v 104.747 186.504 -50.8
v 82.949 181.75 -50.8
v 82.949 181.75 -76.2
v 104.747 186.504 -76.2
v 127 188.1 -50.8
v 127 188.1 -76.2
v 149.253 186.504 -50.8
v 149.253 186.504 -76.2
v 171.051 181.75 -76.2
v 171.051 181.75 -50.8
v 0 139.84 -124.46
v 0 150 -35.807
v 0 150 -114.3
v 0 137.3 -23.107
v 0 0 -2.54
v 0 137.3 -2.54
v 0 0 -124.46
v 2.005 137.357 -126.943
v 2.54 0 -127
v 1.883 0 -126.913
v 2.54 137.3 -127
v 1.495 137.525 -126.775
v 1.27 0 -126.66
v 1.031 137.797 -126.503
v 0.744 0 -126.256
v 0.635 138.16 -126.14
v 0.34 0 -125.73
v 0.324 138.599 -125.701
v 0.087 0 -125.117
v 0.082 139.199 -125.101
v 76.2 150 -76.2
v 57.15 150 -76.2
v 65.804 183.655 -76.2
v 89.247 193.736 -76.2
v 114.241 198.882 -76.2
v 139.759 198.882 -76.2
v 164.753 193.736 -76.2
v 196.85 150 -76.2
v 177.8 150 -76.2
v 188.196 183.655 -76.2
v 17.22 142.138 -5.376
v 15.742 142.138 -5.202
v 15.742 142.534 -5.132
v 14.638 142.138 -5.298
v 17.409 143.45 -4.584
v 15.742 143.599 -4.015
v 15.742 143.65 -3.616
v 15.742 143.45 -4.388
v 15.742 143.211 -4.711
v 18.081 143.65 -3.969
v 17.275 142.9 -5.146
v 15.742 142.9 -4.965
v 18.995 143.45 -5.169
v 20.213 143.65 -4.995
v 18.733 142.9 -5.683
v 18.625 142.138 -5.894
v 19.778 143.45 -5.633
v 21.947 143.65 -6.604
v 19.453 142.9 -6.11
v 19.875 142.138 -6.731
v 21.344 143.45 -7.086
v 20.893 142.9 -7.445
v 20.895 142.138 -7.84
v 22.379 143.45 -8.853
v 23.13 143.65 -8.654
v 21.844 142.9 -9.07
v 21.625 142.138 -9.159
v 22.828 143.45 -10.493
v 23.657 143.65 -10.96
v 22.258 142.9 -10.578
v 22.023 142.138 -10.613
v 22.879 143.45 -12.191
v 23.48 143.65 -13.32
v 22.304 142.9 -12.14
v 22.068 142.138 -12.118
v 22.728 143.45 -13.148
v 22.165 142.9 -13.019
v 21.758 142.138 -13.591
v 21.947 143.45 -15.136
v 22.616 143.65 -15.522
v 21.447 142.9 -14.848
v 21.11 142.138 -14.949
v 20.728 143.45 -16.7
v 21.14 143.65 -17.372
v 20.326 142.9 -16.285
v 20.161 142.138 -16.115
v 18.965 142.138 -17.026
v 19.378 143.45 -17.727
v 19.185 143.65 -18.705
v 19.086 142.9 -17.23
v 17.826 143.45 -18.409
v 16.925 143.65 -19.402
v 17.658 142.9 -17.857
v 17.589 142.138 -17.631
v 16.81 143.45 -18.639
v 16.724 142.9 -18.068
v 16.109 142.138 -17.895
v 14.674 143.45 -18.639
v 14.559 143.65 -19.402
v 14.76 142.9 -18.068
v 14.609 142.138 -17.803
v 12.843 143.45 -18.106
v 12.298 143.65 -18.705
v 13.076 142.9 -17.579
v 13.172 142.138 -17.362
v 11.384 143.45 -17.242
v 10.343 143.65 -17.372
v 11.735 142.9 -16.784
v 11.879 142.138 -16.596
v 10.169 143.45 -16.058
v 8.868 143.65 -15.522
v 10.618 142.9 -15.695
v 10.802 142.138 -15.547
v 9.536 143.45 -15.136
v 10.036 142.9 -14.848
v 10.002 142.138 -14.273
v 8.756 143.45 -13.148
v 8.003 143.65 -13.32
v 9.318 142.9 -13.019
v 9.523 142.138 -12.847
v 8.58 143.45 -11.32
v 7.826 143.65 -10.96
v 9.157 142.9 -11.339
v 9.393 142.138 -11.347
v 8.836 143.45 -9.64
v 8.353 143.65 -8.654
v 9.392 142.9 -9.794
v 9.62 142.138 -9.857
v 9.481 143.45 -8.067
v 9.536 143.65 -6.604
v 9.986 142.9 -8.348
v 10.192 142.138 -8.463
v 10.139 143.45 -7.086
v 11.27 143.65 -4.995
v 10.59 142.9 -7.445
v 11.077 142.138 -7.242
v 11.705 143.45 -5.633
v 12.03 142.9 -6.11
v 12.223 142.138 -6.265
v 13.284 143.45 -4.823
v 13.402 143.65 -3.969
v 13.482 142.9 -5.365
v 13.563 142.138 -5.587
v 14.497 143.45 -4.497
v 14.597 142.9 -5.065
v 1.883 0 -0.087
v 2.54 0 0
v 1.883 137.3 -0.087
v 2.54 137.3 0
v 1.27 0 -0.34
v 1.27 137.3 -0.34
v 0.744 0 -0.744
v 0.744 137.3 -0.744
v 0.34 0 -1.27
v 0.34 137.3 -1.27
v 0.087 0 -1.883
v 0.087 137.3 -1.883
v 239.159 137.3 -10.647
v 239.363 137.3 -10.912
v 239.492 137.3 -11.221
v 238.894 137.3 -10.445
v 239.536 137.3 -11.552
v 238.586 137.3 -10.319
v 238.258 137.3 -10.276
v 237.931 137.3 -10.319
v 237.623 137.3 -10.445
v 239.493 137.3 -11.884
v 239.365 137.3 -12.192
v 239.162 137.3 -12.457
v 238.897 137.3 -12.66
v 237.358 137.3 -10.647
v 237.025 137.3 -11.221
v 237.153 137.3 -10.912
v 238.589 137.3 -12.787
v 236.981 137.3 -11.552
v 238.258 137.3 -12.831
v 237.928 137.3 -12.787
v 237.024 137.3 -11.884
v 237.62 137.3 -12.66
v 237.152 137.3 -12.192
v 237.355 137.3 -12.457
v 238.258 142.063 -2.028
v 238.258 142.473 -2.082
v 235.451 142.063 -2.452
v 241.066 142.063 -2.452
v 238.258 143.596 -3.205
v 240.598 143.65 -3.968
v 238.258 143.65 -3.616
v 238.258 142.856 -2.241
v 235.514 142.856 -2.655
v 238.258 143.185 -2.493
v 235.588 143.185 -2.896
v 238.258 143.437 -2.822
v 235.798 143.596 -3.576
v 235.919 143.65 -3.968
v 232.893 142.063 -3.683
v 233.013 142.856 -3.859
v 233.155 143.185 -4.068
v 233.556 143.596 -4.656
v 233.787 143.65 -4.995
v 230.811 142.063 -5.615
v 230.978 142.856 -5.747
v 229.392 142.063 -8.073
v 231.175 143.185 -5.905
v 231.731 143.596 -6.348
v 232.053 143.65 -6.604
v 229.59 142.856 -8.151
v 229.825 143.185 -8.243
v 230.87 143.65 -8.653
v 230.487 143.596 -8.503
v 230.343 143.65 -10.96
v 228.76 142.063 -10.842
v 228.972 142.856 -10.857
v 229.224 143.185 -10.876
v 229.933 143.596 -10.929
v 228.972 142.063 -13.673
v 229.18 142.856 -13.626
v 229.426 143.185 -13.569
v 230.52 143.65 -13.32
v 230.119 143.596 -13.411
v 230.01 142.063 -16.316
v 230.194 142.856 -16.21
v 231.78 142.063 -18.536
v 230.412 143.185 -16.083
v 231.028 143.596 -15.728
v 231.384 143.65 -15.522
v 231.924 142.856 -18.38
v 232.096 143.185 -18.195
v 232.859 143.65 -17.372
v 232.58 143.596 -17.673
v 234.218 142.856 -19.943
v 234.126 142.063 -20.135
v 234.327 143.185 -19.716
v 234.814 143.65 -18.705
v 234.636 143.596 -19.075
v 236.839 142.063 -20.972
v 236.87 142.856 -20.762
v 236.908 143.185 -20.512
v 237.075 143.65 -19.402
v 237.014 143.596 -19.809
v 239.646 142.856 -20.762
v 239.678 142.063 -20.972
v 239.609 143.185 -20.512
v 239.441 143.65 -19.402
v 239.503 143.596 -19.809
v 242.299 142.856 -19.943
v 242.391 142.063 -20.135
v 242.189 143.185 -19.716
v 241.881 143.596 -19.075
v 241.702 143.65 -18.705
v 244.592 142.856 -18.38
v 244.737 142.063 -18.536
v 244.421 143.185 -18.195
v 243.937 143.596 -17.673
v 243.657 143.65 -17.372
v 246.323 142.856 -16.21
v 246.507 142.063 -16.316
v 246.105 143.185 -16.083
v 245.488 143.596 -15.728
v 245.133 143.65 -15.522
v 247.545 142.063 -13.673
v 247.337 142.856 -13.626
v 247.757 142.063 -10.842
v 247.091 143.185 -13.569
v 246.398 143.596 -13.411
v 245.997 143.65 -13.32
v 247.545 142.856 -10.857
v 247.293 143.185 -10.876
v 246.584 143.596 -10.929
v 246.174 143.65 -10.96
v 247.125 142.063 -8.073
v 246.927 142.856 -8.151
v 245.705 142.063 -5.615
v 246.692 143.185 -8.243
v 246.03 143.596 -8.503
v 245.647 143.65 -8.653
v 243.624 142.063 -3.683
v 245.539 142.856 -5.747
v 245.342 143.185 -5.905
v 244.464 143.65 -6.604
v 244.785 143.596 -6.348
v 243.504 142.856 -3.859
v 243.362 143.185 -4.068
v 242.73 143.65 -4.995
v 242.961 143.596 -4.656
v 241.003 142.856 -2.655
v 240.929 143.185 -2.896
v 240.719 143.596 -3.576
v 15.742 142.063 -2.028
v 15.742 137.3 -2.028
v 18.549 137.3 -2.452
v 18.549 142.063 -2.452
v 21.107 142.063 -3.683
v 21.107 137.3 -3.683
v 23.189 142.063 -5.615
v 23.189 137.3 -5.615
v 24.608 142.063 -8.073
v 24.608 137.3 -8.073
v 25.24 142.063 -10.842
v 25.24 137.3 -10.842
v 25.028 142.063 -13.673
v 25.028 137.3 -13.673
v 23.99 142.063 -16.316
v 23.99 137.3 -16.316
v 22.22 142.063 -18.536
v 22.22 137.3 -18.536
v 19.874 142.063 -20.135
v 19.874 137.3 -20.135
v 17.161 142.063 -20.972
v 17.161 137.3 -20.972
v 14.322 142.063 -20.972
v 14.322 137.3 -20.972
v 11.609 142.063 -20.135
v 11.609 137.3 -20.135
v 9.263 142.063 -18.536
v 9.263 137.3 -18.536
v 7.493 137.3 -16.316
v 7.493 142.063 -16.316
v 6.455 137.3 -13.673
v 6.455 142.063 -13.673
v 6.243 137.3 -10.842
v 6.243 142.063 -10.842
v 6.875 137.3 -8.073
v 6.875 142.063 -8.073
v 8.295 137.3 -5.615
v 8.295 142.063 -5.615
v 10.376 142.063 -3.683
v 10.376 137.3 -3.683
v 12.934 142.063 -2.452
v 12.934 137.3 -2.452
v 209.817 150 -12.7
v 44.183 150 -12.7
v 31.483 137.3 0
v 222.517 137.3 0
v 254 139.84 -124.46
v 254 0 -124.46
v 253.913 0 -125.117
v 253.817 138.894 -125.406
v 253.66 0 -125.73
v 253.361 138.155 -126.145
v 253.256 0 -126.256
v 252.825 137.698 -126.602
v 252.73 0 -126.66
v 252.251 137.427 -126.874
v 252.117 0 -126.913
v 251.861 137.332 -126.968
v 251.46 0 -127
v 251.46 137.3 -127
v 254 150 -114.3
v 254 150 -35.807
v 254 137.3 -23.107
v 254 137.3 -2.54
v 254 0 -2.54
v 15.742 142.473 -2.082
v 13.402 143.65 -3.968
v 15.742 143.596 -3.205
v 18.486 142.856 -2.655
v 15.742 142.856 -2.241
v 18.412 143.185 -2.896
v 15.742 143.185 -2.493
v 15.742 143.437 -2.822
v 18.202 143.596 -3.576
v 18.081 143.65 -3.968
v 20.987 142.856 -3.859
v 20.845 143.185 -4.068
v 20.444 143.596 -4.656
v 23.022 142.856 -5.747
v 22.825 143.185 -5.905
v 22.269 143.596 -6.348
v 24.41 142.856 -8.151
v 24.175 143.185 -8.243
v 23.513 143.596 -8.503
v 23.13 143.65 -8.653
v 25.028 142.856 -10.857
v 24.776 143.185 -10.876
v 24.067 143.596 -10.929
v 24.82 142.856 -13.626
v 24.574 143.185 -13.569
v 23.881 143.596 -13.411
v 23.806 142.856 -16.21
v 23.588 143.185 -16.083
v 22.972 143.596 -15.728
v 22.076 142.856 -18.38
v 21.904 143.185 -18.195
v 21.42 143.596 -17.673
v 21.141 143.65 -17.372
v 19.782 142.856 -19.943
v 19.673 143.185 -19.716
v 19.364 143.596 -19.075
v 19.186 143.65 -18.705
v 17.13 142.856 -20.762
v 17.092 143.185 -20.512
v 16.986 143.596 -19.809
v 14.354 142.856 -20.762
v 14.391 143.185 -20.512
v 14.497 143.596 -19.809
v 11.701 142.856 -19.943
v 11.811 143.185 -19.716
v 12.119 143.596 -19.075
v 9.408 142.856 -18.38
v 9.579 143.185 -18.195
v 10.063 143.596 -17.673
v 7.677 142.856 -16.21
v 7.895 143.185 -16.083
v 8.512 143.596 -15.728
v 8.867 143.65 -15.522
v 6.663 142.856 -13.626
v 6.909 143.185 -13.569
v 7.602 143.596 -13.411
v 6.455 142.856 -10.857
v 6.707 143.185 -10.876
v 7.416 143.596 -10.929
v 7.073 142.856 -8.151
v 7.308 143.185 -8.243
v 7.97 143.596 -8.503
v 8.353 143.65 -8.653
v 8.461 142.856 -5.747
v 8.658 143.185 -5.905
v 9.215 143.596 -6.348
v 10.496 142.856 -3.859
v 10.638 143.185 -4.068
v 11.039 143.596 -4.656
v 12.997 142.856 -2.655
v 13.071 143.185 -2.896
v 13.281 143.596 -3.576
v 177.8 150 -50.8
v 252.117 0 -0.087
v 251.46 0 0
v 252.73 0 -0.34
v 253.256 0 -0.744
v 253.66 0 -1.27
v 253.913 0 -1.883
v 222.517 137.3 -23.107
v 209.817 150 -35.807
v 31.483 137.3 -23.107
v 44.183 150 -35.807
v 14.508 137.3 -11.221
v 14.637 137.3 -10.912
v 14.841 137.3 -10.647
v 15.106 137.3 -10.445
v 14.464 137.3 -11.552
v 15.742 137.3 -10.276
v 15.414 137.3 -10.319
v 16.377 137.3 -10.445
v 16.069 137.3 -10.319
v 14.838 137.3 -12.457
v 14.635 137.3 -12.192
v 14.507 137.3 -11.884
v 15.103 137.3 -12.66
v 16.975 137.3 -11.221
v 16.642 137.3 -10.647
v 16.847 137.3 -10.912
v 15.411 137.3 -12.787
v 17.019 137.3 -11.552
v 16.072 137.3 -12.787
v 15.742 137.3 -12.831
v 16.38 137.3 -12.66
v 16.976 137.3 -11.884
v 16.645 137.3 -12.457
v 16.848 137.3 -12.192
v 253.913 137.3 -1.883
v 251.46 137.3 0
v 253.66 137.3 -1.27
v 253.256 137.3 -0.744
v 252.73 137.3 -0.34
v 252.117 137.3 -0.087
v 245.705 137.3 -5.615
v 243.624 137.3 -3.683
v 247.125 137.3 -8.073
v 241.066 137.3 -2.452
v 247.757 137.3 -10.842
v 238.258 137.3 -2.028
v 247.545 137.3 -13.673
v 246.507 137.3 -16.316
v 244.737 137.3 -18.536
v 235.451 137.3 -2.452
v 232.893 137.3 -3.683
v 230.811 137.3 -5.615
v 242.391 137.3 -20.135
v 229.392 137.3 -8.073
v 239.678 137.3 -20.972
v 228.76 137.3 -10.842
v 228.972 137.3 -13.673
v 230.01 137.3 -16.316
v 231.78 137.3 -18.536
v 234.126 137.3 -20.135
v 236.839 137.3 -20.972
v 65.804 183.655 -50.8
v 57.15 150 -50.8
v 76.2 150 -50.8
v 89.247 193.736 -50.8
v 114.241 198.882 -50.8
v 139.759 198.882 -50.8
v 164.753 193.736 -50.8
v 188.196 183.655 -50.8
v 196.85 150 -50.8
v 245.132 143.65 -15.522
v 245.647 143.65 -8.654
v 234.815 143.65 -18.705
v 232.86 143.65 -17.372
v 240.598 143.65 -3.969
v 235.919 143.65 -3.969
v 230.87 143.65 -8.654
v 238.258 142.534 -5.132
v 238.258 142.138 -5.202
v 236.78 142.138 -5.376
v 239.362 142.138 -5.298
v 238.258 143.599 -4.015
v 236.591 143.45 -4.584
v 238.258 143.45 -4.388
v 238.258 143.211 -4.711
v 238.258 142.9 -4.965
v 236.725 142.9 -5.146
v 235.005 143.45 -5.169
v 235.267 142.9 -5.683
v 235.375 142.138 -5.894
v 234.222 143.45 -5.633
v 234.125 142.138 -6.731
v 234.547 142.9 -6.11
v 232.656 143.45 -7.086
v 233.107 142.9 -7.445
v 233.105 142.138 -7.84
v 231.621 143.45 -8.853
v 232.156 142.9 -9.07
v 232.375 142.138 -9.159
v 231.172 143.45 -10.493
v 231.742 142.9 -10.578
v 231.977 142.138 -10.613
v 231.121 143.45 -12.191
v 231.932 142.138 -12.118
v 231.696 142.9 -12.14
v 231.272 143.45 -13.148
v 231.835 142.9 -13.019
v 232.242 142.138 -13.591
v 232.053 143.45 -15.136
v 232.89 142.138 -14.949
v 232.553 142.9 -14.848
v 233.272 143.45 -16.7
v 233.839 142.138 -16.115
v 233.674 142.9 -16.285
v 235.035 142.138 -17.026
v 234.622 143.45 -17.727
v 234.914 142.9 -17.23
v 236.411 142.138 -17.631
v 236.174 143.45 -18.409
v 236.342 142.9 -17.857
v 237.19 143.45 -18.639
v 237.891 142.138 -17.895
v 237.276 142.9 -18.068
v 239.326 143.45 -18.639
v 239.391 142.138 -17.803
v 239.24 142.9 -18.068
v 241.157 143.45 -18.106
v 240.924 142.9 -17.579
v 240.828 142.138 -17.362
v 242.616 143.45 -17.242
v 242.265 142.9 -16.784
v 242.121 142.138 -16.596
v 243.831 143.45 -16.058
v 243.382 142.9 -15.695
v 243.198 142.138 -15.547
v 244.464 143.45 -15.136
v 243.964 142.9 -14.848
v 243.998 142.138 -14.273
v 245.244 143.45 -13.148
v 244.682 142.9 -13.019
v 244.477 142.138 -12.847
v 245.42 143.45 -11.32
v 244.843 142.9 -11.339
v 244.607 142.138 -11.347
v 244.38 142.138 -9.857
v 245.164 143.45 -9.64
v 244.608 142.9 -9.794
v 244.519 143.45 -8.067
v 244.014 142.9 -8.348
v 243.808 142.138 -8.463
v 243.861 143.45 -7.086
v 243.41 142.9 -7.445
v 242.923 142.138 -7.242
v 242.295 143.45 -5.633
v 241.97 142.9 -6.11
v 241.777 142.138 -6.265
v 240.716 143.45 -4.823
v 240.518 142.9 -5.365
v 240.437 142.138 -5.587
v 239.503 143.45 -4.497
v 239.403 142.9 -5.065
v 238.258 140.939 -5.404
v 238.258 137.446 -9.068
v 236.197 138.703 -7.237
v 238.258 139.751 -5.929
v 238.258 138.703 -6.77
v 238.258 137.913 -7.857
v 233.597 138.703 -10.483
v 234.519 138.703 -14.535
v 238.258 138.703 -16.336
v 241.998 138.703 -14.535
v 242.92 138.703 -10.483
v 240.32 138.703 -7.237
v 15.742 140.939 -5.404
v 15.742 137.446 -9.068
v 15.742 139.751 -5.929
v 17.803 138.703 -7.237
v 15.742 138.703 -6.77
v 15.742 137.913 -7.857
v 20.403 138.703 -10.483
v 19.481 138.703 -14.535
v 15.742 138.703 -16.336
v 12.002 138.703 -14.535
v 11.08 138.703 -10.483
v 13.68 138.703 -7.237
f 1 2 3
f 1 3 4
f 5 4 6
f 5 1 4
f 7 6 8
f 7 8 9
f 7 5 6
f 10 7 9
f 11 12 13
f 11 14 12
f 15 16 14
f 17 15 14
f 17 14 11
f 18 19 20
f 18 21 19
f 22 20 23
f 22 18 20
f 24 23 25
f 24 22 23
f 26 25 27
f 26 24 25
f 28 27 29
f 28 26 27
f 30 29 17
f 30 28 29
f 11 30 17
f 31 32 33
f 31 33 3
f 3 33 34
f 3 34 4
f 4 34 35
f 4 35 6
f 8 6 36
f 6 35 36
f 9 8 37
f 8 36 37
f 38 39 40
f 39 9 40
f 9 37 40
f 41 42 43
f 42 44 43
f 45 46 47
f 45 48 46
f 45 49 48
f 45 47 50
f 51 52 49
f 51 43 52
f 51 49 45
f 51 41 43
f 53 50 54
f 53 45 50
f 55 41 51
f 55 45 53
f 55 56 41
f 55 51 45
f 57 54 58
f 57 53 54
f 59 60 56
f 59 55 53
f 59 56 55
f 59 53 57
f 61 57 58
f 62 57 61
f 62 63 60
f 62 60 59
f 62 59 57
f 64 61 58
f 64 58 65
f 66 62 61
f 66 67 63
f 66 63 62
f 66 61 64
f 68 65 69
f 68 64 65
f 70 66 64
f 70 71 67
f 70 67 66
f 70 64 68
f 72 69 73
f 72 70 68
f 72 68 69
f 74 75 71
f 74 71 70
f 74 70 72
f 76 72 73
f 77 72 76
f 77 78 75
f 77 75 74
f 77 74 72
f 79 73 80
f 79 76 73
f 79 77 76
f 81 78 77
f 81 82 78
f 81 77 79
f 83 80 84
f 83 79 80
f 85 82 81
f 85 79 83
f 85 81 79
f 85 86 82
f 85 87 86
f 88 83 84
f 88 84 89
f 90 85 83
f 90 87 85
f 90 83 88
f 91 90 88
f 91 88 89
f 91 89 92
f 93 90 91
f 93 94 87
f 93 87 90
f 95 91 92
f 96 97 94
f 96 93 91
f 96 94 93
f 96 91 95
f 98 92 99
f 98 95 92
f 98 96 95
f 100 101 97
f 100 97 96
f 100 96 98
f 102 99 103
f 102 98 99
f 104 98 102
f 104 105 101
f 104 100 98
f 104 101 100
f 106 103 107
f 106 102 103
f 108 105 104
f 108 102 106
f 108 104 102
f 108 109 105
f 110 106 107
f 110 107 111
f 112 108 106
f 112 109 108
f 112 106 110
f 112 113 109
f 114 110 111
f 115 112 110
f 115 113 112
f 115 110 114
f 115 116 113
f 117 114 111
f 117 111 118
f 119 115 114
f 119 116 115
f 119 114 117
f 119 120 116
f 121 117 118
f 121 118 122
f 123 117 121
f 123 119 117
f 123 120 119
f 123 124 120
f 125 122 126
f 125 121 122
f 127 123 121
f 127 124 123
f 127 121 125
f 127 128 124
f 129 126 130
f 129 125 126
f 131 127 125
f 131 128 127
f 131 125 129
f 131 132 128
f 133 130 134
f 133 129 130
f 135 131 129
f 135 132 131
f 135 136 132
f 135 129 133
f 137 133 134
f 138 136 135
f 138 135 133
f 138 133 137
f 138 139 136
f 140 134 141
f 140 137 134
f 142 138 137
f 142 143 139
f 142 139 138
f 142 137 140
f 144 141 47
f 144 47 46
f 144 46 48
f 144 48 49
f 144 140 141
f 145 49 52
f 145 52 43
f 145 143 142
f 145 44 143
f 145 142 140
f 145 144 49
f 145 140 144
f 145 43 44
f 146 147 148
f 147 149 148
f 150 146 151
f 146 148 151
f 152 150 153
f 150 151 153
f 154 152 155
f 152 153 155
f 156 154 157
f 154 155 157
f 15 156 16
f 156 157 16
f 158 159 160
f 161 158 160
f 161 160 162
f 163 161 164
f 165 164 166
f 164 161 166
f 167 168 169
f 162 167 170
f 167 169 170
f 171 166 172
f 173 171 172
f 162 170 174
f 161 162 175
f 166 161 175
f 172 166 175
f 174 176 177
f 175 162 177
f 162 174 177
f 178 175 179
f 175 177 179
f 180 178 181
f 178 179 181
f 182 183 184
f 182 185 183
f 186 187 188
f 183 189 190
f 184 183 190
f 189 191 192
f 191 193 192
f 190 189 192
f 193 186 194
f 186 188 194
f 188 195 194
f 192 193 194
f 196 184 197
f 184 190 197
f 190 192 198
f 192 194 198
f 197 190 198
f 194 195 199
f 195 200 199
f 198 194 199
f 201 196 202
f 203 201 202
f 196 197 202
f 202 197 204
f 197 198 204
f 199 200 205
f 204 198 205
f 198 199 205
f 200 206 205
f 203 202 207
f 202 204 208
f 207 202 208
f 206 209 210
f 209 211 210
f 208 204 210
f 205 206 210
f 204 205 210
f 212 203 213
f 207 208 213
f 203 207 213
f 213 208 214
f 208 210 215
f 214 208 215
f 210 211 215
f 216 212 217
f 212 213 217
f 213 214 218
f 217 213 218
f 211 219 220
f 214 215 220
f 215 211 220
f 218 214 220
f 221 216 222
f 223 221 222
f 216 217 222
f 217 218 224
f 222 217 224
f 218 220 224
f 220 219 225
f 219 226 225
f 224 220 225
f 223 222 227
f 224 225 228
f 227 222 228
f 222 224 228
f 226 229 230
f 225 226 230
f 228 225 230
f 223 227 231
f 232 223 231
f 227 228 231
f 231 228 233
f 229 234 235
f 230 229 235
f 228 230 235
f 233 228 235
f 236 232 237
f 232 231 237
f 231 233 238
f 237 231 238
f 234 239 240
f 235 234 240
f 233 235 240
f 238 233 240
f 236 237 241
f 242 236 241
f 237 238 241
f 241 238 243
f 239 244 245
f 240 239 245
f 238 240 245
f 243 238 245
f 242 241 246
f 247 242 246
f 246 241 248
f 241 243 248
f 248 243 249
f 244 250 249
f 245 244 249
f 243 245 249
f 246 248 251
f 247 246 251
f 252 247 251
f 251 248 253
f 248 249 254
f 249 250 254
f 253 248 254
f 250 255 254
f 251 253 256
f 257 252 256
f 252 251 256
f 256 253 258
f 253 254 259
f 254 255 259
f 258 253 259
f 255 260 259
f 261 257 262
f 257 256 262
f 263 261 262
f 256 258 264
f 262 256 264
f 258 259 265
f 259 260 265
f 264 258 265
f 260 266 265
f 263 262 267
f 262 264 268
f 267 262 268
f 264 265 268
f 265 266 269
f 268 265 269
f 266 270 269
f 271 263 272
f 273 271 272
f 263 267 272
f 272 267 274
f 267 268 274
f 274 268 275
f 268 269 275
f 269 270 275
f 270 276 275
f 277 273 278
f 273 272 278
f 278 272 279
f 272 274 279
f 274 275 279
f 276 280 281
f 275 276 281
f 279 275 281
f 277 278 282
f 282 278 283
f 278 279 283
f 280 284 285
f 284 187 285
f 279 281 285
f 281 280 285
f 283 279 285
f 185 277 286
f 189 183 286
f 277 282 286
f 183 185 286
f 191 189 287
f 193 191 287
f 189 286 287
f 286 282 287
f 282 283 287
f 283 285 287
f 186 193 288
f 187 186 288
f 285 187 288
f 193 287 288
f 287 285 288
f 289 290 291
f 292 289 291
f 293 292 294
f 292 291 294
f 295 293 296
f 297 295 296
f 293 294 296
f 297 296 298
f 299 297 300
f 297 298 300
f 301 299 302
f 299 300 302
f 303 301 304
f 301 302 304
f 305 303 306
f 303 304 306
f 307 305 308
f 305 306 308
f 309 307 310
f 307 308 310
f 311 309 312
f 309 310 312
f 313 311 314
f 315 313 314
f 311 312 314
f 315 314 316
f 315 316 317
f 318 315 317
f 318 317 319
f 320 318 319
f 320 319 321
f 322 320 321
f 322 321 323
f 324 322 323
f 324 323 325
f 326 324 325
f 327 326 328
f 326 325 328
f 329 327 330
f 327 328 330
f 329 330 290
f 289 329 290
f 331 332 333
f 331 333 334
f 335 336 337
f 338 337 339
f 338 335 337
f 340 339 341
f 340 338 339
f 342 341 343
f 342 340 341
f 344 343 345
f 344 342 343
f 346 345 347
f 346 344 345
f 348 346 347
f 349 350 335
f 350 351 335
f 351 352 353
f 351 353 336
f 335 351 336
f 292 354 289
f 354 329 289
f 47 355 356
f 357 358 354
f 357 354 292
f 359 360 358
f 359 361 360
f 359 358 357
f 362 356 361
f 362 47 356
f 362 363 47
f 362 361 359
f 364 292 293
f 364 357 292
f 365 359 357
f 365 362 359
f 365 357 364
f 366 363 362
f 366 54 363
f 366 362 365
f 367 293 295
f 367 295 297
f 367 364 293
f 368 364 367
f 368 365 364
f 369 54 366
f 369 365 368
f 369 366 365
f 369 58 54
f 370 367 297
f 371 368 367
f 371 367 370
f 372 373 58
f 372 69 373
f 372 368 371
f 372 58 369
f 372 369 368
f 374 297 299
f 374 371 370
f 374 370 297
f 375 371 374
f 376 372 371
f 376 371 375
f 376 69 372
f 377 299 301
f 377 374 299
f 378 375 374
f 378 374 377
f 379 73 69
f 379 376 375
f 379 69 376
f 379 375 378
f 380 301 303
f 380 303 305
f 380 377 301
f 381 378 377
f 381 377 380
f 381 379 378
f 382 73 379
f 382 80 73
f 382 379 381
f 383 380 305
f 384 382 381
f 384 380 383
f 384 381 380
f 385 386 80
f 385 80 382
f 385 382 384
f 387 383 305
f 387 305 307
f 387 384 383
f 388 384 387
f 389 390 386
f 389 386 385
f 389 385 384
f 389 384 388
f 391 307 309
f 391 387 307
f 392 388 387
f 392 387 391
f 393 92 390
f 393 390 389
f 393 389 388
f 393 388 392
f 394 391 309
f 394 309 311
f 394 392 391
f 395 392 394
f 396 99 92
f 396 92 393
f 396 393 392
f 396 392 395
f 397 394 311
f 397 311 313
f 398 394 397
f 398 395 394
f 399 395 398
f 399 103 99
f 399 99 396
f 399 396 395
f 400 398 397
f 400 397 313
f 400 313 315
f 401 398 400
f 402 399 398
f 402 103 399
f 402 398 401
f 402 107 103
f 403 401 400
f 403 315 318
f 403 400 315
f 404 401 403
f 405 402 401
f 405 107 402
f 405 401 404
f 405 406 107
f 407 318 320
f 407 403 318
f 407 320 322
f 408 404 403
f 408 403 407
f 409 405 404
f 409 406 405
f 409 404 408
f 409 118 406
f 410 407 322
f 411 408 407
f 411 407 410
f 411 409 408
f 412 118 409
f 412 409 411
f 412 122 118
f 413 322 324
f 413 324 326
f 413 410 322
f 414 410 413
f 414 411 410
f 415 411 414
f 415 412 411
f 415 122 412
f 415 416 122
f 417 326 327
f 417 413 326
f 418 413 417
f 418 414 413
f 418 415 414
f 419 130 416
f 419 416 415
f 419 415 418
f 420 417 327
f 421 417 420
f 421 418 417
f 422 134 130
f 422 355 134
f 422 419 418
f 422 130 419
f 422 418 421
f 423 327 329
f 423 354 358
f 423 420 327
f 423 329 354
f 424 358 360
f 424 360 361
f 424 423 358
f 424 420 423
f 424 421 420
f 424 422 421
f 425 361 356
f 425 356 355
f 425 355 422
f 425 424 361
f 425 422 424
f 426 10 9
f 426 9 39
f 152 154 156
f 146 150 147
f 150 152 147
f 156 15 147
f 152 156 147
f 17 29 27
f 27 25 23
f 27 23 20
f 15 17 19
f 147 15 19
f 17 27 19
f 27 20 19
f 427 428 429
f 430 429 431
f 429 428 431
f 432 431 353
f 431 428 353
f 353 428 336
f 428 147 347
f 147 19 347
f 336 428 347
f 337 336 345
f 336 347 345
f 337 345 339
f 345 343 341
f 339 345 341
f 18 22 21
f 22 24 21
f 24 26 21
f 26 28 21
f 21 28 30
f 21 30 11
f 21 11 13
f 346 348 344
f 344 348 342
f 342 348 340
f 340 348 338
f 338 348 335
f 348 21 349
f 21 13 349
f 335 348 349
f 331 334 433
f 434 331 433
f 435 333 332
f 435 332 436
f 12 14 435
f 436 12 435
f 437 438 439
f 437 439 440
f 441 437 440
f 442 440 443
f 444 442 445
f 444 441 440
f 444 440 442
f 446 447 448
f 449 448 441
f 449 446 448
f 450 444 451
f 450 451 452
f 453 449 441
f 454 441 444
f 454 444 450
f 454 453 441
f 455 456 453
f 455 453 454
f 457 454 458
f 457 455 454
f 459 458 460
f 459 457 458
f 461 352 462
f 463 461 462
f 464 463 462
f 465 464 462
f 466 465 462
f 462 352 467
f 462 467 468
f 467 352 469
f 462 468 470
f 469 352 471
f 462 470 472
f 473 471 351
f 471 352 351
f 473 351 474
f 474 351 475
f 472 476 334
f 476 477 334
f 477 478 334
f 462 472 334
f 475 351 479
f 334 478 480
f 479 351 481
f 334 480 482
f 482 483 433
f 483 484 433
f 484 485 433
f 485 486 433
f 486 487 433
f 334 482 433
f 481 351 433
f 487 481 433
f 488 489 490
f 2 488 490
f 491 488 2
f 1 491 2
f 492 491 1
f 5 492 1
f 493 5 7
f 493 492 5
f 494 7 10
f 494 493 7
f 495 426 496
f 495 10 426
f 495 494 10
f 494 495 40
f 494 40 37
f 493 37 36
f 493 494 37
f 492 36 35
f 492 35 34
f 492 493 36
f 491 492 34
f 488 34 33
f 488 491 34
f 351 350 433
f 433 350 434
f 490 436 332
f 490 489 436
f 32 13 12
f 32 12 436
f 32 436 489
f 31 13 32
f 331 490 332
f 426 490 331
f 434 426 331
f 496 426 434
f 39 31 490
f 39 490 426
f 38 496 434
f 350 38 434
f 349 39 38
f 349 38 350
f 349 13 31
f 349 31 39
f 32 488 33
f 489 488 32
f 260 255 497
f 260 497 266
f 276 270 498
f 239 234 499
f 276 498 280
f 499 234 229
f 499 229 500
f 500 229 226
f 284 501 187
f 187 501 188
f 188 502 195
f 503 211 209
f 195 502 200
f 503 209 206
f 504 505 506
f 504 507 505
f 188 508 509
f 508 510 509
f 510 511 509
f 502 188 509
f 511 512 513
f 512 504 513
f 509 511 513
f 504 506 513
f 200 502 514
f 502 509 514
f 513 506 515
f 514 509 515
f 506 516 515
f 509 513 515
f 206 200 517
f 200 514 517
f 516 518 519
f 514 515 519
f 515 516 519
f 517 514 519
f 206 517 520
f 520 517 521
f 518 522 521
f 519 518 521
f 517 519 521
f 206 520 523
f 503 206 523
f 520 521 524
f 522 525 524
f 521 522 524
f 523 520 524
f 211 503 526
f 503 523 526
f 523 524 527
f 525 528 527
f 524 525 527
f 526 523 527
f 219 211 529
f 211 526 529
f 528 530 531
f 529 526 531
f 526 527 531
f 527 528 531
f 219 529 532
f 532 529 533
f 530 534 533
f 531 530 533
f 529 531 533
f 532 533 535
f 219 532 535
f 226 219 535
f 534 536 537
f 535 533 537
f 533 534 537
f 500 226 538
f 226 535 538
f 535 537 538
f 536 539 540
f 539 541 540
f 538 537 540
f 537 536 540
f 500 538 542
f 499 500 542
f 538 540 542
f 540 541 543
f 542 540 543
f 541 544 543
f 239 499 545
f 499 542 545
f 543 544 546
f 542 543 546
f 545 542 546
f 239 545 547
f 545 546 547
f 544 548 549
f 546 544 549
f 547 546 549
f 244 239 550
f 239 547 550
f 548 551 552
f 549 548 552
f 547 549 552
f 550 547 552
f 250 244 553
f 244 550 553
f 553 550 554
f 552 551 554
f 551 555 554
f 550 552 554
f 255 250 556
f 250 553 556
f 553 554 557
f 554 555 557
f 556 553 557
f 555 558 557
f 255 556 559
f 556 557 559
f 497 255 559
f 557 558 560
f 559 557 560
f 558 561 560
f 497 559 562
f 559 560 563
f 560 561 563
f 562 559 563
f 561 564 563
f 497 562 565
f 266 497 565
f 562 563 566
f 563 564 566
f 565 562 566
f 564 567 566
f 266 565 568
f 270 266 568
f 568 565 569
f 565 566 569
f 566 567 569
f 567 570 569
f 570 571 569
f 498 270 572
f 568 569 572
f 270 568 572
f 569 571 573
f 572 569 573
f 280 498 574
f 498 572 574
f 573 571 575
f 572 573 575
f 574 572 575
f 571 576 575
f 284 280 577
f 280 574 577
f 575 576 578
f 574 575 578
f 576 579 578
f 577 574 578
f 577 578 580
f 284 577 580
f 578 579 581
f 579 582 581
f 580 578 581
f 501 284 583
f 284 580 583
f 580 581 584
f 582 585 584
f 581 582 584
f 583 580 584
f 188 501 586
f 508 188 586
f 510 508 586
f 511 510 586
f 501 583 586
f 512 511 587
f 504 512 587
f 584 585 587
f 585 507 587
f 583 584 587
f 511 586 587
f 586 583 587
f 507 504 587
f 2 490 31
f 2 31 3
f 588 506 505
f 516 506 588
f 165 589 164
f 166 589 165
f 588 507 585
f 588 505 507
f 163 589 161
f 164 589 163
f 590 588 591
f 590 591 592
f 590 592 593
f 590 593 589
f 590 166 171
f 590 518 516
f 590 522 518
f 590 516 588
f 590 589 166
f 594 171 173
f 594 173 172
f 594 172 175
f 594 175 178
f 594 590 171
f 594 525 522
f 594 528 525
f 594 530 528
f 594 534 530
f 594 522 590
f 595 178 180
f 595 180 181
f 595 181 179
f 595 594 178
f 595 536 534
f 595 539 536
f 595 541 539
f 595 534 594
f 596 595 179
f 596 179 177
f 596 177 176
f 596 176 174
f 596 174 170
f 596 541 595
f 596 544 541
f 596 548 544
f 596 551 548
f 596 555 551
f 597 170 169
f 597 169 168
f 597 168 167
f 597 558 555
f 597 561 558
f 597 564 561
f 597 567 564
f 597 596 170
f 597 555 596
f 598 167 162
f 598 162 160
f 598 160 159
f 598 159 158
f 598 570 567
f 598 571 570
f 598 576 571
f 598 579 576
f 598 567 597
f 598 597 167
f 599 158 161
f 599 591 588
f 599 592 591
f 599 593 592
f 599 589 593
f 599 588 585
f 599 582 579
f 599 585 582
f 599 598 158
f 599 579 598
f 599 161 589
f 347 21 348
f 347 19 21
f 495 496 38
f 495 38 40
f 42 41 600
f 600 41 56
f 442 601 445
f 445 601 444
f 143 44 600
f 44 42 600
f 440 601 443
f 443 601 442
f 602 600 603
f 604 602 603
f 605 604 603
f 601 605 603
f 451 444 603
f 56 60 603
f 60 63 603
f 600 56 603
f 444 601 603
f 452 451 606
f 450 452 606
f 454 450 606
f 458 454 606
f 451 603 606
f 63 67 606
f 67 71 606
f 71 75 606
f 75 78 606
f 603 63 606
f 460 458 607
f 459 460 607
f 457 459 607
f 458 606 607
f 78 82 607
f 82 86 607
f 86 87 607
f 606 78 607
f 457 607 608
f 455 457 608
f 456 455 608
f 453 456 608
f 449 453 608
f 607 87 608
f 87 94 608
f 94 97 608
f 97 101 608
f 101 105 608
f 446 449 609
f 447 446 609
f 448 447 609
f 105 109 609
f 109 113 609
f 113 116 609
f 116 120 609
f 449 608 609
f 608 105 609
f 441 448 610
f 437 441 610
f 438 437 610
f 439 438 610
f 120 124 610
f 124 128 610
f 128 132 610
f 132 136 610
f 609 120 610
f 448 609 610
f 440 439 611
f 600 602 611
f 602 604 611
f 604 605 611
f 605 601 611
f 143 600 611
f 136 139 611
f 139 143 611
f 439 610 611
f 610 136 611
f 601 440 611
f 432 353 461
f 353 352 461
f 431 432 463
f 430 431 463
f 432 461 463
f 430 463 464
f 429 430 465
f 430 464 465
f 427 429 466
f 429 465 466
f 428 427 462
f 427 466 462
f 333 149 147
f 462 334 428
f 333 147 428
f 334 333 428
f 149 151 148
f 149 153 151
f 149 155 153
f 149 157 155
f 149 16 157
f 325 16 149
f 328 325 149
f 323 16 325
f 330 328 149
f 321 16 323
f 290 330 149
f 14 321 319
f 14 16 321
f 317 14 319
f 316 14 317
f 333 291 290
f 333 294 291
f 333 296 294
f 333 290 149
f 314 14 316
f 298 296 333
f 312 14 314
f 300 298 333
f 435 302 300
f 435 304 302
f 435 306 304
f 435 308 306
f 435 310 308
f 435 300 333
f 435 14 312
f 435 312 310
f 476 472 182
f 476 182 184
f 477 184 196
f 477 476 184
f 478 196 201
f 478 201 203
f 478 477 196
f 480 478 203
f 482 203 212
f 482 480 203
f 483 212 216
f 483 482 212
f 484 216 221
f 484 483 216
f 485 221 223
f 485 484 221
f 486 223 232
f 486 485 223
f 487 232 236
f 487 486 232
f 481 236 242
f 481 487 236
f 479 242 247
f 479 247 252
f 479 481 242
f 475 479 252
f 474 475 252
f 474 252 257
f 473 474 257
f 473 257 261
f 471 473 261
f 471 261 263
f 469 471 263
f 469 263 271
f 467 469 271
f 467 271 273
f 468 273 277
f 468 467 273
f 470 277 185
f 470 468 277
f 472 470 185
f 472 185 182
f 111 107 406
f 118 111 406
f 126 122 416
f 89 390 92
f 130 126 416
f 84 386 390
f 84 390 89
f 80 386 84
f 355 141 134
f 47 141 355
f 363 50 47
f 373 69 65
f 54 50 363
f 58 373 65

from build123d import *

# Parameters (mm, degrees)
SKETCH1_W            = 254
SKETCH1_H            = 127
BOSS_EXTRUDE1_DEPTH  = 150
SKETCH2_W            = 31.483174514
SKETCH2_H            = 23.106740065
CUT_EXTRUDE1_DEPTH   = 12.7
SKETCH3_R            = 9.525
SKETCH3_R_2          = 6.35
BOSS_EXTRUDE2_DEPTH  = 6.35
FILLET1_R            = 1.5875
FILLET1_OF_MIRROR1_R = 1.5875
CHAMFER1_SIZE        = 12.7
FILLET2_R            = 5.08
FILLET3_R            = 2.54
BOSS_EXTRUDE3_START  = -50.8
BOSS_EXTRUDE3_DEPTH  = 25.4


with BuildPart() as part:
    # Sketch1 → Boss-Extrude1 (new body)
    with BuildSketch(Plane(origin=(0, 0, 0), x_dir=(1, 0, 0), z_dir=(0, 1, 0))):
        with Locations((127, 63.5)):
            Rectangle(SKETCH1_W, SKETCH1_H)
    extrude(amount=BOSS_EXTRUDE1_DEPTH)

    # Sketch2 → Cut-Extrude1 (cut)
    with BuildSketch(Plane(origin=(0, 150, 0), x_dir=(1, 0, 0), z_dir=(0, 1, 0))):
        with Locations((15.741587257, 11.553370033)):
            Rectangle(SKETCH2_W, SKETCH2_H)
    cut_extrude1 = extrude(amount=-CUT_EXTRUDE1_DEPTH, mode=Mode.SUBTRACT)

    # Sketch3 → Boss-Extrude2 (add)
    with BuildSketch(Plane(origin=(0, 137.3, 0), x_dir=(1, 0, 0), z_dir=(0, 1, 0))):
        with Locations(Location((15.741587257, 11.553370033, 0), (0, 0, 270))):
            Circle(SKETCH3_R)
        with Locations(Location((15.741587257, 11.553370033, 0), (0, 0, 270))):
            Circle(SKETCH3_R_2, mode=Mode.SUBTRACT)
    boss_extrude2 = extrude(amount=BOSS_EXTRUDE2_DEPTH)

    # Fillet1
    fillet1_edges = [part.edges().sort_by_distance(p)[0] for p in [
        (15.741587257, 143.65, -21.078370033),
        (15.741587257, 143.65, -17.903370033),
    ]]
    fillet(fillet1_edges, radius=FILLET1_R - 0.0001)  # a hair under: the kernel refuses the full size

    # Mirror1: Cut-Extrude1, Boss-Extrude2 across plane
    add(cut_extrude1.mirror(Plane(origin=(127, 0, 0), x_dir=(0, 0, 1), z_dir=(1, 0, 0))), mode=Mode.SUBTRACT)
    add(boss_extrude2.mirror(Plane(origin=(127, 0, 0), x_dir=(0, 0, 1), z_dir=(1, 0, 0))))

    # Fillet1 of Mirror1
    fillet1_of_mirror1_edges = [part.edges().sort_by_distance(p)[0] for p in [
        (238.258412743, 143.65, -21.078370033),
        (238.258412743, 143.65, -17.903370033),
    ]]
    fillet(fillet1_of_mirror1_edges, radius=FILLET1_OF_MIRROR1_R - 0.0001)  # a hair under: the kernel refuses the full size

    # Chamfer1
    chamfer1_edges = [part.edges().sort_by_distance(p)[0] for p in [
        (31.483174514, 150, -11.553370033),
        (15.741587257, 150, -23.106740065),
        (127, 150, -127),
        (238.258412743, 150, -23.106740065),
        (222.516825486, 150, -11.553370033),
        (127, 150, 0),
    ]]
    chamfer(chamfer1_edges, length=CHAMFER1_SIZE - 0.0001)  # a hair under: the kernel refuses the full size

    # Fillet2
    fillet2_edges = [part.edges().sort_by_distance(p)[0] for p in [
        (238.258412743, 137.3, -17.903370033),
        (15.741587257, 137.3, -17.903370033),
    ]]
    fillet(fillet2_edges, radius=FILLET2_R)

    # Fillet3
    fillet3_edges = [part.edges().sort_by_distance(p)[0] for p in [
        (0, 68.65, 0),
        (254, 68.65, 0),
        (0, 68.65005, -127),
        (254, 68.65005, -127),
    ]]
    fillet(fillet3_edges, radius=FILLET3_R)

    # Sketch4 → Boss-Extrude3 (add)
    with BuildSketch(Plane.XY.offset(BOSS_EXTRUDE3_START)):
        with BuildLine():
            Line((177.8, 150), (196.85, 150))
            Line((196.85, 150), (188.196329167, 183.655))
            ThreePointArc((188.196329167, 183.655), (127, 199.53), (65.803670833, 183.655))
            Line((65.803670833, 183.655), (57.15, 150))
            Line((57.15, 150), (76.2, 150))
            Line((76.2, 150), (82.948670833, 181.75))
            ThreePointArc((82.948670833, 181.75), (127, 188.1), (171.051329167, 181.75))
            Line((171.051329167, 181.75), (177.8, 150))
        make_face()
    extrude(amount=-BOSS_EXTRUDE3_DEPTH)


solid = part.part
